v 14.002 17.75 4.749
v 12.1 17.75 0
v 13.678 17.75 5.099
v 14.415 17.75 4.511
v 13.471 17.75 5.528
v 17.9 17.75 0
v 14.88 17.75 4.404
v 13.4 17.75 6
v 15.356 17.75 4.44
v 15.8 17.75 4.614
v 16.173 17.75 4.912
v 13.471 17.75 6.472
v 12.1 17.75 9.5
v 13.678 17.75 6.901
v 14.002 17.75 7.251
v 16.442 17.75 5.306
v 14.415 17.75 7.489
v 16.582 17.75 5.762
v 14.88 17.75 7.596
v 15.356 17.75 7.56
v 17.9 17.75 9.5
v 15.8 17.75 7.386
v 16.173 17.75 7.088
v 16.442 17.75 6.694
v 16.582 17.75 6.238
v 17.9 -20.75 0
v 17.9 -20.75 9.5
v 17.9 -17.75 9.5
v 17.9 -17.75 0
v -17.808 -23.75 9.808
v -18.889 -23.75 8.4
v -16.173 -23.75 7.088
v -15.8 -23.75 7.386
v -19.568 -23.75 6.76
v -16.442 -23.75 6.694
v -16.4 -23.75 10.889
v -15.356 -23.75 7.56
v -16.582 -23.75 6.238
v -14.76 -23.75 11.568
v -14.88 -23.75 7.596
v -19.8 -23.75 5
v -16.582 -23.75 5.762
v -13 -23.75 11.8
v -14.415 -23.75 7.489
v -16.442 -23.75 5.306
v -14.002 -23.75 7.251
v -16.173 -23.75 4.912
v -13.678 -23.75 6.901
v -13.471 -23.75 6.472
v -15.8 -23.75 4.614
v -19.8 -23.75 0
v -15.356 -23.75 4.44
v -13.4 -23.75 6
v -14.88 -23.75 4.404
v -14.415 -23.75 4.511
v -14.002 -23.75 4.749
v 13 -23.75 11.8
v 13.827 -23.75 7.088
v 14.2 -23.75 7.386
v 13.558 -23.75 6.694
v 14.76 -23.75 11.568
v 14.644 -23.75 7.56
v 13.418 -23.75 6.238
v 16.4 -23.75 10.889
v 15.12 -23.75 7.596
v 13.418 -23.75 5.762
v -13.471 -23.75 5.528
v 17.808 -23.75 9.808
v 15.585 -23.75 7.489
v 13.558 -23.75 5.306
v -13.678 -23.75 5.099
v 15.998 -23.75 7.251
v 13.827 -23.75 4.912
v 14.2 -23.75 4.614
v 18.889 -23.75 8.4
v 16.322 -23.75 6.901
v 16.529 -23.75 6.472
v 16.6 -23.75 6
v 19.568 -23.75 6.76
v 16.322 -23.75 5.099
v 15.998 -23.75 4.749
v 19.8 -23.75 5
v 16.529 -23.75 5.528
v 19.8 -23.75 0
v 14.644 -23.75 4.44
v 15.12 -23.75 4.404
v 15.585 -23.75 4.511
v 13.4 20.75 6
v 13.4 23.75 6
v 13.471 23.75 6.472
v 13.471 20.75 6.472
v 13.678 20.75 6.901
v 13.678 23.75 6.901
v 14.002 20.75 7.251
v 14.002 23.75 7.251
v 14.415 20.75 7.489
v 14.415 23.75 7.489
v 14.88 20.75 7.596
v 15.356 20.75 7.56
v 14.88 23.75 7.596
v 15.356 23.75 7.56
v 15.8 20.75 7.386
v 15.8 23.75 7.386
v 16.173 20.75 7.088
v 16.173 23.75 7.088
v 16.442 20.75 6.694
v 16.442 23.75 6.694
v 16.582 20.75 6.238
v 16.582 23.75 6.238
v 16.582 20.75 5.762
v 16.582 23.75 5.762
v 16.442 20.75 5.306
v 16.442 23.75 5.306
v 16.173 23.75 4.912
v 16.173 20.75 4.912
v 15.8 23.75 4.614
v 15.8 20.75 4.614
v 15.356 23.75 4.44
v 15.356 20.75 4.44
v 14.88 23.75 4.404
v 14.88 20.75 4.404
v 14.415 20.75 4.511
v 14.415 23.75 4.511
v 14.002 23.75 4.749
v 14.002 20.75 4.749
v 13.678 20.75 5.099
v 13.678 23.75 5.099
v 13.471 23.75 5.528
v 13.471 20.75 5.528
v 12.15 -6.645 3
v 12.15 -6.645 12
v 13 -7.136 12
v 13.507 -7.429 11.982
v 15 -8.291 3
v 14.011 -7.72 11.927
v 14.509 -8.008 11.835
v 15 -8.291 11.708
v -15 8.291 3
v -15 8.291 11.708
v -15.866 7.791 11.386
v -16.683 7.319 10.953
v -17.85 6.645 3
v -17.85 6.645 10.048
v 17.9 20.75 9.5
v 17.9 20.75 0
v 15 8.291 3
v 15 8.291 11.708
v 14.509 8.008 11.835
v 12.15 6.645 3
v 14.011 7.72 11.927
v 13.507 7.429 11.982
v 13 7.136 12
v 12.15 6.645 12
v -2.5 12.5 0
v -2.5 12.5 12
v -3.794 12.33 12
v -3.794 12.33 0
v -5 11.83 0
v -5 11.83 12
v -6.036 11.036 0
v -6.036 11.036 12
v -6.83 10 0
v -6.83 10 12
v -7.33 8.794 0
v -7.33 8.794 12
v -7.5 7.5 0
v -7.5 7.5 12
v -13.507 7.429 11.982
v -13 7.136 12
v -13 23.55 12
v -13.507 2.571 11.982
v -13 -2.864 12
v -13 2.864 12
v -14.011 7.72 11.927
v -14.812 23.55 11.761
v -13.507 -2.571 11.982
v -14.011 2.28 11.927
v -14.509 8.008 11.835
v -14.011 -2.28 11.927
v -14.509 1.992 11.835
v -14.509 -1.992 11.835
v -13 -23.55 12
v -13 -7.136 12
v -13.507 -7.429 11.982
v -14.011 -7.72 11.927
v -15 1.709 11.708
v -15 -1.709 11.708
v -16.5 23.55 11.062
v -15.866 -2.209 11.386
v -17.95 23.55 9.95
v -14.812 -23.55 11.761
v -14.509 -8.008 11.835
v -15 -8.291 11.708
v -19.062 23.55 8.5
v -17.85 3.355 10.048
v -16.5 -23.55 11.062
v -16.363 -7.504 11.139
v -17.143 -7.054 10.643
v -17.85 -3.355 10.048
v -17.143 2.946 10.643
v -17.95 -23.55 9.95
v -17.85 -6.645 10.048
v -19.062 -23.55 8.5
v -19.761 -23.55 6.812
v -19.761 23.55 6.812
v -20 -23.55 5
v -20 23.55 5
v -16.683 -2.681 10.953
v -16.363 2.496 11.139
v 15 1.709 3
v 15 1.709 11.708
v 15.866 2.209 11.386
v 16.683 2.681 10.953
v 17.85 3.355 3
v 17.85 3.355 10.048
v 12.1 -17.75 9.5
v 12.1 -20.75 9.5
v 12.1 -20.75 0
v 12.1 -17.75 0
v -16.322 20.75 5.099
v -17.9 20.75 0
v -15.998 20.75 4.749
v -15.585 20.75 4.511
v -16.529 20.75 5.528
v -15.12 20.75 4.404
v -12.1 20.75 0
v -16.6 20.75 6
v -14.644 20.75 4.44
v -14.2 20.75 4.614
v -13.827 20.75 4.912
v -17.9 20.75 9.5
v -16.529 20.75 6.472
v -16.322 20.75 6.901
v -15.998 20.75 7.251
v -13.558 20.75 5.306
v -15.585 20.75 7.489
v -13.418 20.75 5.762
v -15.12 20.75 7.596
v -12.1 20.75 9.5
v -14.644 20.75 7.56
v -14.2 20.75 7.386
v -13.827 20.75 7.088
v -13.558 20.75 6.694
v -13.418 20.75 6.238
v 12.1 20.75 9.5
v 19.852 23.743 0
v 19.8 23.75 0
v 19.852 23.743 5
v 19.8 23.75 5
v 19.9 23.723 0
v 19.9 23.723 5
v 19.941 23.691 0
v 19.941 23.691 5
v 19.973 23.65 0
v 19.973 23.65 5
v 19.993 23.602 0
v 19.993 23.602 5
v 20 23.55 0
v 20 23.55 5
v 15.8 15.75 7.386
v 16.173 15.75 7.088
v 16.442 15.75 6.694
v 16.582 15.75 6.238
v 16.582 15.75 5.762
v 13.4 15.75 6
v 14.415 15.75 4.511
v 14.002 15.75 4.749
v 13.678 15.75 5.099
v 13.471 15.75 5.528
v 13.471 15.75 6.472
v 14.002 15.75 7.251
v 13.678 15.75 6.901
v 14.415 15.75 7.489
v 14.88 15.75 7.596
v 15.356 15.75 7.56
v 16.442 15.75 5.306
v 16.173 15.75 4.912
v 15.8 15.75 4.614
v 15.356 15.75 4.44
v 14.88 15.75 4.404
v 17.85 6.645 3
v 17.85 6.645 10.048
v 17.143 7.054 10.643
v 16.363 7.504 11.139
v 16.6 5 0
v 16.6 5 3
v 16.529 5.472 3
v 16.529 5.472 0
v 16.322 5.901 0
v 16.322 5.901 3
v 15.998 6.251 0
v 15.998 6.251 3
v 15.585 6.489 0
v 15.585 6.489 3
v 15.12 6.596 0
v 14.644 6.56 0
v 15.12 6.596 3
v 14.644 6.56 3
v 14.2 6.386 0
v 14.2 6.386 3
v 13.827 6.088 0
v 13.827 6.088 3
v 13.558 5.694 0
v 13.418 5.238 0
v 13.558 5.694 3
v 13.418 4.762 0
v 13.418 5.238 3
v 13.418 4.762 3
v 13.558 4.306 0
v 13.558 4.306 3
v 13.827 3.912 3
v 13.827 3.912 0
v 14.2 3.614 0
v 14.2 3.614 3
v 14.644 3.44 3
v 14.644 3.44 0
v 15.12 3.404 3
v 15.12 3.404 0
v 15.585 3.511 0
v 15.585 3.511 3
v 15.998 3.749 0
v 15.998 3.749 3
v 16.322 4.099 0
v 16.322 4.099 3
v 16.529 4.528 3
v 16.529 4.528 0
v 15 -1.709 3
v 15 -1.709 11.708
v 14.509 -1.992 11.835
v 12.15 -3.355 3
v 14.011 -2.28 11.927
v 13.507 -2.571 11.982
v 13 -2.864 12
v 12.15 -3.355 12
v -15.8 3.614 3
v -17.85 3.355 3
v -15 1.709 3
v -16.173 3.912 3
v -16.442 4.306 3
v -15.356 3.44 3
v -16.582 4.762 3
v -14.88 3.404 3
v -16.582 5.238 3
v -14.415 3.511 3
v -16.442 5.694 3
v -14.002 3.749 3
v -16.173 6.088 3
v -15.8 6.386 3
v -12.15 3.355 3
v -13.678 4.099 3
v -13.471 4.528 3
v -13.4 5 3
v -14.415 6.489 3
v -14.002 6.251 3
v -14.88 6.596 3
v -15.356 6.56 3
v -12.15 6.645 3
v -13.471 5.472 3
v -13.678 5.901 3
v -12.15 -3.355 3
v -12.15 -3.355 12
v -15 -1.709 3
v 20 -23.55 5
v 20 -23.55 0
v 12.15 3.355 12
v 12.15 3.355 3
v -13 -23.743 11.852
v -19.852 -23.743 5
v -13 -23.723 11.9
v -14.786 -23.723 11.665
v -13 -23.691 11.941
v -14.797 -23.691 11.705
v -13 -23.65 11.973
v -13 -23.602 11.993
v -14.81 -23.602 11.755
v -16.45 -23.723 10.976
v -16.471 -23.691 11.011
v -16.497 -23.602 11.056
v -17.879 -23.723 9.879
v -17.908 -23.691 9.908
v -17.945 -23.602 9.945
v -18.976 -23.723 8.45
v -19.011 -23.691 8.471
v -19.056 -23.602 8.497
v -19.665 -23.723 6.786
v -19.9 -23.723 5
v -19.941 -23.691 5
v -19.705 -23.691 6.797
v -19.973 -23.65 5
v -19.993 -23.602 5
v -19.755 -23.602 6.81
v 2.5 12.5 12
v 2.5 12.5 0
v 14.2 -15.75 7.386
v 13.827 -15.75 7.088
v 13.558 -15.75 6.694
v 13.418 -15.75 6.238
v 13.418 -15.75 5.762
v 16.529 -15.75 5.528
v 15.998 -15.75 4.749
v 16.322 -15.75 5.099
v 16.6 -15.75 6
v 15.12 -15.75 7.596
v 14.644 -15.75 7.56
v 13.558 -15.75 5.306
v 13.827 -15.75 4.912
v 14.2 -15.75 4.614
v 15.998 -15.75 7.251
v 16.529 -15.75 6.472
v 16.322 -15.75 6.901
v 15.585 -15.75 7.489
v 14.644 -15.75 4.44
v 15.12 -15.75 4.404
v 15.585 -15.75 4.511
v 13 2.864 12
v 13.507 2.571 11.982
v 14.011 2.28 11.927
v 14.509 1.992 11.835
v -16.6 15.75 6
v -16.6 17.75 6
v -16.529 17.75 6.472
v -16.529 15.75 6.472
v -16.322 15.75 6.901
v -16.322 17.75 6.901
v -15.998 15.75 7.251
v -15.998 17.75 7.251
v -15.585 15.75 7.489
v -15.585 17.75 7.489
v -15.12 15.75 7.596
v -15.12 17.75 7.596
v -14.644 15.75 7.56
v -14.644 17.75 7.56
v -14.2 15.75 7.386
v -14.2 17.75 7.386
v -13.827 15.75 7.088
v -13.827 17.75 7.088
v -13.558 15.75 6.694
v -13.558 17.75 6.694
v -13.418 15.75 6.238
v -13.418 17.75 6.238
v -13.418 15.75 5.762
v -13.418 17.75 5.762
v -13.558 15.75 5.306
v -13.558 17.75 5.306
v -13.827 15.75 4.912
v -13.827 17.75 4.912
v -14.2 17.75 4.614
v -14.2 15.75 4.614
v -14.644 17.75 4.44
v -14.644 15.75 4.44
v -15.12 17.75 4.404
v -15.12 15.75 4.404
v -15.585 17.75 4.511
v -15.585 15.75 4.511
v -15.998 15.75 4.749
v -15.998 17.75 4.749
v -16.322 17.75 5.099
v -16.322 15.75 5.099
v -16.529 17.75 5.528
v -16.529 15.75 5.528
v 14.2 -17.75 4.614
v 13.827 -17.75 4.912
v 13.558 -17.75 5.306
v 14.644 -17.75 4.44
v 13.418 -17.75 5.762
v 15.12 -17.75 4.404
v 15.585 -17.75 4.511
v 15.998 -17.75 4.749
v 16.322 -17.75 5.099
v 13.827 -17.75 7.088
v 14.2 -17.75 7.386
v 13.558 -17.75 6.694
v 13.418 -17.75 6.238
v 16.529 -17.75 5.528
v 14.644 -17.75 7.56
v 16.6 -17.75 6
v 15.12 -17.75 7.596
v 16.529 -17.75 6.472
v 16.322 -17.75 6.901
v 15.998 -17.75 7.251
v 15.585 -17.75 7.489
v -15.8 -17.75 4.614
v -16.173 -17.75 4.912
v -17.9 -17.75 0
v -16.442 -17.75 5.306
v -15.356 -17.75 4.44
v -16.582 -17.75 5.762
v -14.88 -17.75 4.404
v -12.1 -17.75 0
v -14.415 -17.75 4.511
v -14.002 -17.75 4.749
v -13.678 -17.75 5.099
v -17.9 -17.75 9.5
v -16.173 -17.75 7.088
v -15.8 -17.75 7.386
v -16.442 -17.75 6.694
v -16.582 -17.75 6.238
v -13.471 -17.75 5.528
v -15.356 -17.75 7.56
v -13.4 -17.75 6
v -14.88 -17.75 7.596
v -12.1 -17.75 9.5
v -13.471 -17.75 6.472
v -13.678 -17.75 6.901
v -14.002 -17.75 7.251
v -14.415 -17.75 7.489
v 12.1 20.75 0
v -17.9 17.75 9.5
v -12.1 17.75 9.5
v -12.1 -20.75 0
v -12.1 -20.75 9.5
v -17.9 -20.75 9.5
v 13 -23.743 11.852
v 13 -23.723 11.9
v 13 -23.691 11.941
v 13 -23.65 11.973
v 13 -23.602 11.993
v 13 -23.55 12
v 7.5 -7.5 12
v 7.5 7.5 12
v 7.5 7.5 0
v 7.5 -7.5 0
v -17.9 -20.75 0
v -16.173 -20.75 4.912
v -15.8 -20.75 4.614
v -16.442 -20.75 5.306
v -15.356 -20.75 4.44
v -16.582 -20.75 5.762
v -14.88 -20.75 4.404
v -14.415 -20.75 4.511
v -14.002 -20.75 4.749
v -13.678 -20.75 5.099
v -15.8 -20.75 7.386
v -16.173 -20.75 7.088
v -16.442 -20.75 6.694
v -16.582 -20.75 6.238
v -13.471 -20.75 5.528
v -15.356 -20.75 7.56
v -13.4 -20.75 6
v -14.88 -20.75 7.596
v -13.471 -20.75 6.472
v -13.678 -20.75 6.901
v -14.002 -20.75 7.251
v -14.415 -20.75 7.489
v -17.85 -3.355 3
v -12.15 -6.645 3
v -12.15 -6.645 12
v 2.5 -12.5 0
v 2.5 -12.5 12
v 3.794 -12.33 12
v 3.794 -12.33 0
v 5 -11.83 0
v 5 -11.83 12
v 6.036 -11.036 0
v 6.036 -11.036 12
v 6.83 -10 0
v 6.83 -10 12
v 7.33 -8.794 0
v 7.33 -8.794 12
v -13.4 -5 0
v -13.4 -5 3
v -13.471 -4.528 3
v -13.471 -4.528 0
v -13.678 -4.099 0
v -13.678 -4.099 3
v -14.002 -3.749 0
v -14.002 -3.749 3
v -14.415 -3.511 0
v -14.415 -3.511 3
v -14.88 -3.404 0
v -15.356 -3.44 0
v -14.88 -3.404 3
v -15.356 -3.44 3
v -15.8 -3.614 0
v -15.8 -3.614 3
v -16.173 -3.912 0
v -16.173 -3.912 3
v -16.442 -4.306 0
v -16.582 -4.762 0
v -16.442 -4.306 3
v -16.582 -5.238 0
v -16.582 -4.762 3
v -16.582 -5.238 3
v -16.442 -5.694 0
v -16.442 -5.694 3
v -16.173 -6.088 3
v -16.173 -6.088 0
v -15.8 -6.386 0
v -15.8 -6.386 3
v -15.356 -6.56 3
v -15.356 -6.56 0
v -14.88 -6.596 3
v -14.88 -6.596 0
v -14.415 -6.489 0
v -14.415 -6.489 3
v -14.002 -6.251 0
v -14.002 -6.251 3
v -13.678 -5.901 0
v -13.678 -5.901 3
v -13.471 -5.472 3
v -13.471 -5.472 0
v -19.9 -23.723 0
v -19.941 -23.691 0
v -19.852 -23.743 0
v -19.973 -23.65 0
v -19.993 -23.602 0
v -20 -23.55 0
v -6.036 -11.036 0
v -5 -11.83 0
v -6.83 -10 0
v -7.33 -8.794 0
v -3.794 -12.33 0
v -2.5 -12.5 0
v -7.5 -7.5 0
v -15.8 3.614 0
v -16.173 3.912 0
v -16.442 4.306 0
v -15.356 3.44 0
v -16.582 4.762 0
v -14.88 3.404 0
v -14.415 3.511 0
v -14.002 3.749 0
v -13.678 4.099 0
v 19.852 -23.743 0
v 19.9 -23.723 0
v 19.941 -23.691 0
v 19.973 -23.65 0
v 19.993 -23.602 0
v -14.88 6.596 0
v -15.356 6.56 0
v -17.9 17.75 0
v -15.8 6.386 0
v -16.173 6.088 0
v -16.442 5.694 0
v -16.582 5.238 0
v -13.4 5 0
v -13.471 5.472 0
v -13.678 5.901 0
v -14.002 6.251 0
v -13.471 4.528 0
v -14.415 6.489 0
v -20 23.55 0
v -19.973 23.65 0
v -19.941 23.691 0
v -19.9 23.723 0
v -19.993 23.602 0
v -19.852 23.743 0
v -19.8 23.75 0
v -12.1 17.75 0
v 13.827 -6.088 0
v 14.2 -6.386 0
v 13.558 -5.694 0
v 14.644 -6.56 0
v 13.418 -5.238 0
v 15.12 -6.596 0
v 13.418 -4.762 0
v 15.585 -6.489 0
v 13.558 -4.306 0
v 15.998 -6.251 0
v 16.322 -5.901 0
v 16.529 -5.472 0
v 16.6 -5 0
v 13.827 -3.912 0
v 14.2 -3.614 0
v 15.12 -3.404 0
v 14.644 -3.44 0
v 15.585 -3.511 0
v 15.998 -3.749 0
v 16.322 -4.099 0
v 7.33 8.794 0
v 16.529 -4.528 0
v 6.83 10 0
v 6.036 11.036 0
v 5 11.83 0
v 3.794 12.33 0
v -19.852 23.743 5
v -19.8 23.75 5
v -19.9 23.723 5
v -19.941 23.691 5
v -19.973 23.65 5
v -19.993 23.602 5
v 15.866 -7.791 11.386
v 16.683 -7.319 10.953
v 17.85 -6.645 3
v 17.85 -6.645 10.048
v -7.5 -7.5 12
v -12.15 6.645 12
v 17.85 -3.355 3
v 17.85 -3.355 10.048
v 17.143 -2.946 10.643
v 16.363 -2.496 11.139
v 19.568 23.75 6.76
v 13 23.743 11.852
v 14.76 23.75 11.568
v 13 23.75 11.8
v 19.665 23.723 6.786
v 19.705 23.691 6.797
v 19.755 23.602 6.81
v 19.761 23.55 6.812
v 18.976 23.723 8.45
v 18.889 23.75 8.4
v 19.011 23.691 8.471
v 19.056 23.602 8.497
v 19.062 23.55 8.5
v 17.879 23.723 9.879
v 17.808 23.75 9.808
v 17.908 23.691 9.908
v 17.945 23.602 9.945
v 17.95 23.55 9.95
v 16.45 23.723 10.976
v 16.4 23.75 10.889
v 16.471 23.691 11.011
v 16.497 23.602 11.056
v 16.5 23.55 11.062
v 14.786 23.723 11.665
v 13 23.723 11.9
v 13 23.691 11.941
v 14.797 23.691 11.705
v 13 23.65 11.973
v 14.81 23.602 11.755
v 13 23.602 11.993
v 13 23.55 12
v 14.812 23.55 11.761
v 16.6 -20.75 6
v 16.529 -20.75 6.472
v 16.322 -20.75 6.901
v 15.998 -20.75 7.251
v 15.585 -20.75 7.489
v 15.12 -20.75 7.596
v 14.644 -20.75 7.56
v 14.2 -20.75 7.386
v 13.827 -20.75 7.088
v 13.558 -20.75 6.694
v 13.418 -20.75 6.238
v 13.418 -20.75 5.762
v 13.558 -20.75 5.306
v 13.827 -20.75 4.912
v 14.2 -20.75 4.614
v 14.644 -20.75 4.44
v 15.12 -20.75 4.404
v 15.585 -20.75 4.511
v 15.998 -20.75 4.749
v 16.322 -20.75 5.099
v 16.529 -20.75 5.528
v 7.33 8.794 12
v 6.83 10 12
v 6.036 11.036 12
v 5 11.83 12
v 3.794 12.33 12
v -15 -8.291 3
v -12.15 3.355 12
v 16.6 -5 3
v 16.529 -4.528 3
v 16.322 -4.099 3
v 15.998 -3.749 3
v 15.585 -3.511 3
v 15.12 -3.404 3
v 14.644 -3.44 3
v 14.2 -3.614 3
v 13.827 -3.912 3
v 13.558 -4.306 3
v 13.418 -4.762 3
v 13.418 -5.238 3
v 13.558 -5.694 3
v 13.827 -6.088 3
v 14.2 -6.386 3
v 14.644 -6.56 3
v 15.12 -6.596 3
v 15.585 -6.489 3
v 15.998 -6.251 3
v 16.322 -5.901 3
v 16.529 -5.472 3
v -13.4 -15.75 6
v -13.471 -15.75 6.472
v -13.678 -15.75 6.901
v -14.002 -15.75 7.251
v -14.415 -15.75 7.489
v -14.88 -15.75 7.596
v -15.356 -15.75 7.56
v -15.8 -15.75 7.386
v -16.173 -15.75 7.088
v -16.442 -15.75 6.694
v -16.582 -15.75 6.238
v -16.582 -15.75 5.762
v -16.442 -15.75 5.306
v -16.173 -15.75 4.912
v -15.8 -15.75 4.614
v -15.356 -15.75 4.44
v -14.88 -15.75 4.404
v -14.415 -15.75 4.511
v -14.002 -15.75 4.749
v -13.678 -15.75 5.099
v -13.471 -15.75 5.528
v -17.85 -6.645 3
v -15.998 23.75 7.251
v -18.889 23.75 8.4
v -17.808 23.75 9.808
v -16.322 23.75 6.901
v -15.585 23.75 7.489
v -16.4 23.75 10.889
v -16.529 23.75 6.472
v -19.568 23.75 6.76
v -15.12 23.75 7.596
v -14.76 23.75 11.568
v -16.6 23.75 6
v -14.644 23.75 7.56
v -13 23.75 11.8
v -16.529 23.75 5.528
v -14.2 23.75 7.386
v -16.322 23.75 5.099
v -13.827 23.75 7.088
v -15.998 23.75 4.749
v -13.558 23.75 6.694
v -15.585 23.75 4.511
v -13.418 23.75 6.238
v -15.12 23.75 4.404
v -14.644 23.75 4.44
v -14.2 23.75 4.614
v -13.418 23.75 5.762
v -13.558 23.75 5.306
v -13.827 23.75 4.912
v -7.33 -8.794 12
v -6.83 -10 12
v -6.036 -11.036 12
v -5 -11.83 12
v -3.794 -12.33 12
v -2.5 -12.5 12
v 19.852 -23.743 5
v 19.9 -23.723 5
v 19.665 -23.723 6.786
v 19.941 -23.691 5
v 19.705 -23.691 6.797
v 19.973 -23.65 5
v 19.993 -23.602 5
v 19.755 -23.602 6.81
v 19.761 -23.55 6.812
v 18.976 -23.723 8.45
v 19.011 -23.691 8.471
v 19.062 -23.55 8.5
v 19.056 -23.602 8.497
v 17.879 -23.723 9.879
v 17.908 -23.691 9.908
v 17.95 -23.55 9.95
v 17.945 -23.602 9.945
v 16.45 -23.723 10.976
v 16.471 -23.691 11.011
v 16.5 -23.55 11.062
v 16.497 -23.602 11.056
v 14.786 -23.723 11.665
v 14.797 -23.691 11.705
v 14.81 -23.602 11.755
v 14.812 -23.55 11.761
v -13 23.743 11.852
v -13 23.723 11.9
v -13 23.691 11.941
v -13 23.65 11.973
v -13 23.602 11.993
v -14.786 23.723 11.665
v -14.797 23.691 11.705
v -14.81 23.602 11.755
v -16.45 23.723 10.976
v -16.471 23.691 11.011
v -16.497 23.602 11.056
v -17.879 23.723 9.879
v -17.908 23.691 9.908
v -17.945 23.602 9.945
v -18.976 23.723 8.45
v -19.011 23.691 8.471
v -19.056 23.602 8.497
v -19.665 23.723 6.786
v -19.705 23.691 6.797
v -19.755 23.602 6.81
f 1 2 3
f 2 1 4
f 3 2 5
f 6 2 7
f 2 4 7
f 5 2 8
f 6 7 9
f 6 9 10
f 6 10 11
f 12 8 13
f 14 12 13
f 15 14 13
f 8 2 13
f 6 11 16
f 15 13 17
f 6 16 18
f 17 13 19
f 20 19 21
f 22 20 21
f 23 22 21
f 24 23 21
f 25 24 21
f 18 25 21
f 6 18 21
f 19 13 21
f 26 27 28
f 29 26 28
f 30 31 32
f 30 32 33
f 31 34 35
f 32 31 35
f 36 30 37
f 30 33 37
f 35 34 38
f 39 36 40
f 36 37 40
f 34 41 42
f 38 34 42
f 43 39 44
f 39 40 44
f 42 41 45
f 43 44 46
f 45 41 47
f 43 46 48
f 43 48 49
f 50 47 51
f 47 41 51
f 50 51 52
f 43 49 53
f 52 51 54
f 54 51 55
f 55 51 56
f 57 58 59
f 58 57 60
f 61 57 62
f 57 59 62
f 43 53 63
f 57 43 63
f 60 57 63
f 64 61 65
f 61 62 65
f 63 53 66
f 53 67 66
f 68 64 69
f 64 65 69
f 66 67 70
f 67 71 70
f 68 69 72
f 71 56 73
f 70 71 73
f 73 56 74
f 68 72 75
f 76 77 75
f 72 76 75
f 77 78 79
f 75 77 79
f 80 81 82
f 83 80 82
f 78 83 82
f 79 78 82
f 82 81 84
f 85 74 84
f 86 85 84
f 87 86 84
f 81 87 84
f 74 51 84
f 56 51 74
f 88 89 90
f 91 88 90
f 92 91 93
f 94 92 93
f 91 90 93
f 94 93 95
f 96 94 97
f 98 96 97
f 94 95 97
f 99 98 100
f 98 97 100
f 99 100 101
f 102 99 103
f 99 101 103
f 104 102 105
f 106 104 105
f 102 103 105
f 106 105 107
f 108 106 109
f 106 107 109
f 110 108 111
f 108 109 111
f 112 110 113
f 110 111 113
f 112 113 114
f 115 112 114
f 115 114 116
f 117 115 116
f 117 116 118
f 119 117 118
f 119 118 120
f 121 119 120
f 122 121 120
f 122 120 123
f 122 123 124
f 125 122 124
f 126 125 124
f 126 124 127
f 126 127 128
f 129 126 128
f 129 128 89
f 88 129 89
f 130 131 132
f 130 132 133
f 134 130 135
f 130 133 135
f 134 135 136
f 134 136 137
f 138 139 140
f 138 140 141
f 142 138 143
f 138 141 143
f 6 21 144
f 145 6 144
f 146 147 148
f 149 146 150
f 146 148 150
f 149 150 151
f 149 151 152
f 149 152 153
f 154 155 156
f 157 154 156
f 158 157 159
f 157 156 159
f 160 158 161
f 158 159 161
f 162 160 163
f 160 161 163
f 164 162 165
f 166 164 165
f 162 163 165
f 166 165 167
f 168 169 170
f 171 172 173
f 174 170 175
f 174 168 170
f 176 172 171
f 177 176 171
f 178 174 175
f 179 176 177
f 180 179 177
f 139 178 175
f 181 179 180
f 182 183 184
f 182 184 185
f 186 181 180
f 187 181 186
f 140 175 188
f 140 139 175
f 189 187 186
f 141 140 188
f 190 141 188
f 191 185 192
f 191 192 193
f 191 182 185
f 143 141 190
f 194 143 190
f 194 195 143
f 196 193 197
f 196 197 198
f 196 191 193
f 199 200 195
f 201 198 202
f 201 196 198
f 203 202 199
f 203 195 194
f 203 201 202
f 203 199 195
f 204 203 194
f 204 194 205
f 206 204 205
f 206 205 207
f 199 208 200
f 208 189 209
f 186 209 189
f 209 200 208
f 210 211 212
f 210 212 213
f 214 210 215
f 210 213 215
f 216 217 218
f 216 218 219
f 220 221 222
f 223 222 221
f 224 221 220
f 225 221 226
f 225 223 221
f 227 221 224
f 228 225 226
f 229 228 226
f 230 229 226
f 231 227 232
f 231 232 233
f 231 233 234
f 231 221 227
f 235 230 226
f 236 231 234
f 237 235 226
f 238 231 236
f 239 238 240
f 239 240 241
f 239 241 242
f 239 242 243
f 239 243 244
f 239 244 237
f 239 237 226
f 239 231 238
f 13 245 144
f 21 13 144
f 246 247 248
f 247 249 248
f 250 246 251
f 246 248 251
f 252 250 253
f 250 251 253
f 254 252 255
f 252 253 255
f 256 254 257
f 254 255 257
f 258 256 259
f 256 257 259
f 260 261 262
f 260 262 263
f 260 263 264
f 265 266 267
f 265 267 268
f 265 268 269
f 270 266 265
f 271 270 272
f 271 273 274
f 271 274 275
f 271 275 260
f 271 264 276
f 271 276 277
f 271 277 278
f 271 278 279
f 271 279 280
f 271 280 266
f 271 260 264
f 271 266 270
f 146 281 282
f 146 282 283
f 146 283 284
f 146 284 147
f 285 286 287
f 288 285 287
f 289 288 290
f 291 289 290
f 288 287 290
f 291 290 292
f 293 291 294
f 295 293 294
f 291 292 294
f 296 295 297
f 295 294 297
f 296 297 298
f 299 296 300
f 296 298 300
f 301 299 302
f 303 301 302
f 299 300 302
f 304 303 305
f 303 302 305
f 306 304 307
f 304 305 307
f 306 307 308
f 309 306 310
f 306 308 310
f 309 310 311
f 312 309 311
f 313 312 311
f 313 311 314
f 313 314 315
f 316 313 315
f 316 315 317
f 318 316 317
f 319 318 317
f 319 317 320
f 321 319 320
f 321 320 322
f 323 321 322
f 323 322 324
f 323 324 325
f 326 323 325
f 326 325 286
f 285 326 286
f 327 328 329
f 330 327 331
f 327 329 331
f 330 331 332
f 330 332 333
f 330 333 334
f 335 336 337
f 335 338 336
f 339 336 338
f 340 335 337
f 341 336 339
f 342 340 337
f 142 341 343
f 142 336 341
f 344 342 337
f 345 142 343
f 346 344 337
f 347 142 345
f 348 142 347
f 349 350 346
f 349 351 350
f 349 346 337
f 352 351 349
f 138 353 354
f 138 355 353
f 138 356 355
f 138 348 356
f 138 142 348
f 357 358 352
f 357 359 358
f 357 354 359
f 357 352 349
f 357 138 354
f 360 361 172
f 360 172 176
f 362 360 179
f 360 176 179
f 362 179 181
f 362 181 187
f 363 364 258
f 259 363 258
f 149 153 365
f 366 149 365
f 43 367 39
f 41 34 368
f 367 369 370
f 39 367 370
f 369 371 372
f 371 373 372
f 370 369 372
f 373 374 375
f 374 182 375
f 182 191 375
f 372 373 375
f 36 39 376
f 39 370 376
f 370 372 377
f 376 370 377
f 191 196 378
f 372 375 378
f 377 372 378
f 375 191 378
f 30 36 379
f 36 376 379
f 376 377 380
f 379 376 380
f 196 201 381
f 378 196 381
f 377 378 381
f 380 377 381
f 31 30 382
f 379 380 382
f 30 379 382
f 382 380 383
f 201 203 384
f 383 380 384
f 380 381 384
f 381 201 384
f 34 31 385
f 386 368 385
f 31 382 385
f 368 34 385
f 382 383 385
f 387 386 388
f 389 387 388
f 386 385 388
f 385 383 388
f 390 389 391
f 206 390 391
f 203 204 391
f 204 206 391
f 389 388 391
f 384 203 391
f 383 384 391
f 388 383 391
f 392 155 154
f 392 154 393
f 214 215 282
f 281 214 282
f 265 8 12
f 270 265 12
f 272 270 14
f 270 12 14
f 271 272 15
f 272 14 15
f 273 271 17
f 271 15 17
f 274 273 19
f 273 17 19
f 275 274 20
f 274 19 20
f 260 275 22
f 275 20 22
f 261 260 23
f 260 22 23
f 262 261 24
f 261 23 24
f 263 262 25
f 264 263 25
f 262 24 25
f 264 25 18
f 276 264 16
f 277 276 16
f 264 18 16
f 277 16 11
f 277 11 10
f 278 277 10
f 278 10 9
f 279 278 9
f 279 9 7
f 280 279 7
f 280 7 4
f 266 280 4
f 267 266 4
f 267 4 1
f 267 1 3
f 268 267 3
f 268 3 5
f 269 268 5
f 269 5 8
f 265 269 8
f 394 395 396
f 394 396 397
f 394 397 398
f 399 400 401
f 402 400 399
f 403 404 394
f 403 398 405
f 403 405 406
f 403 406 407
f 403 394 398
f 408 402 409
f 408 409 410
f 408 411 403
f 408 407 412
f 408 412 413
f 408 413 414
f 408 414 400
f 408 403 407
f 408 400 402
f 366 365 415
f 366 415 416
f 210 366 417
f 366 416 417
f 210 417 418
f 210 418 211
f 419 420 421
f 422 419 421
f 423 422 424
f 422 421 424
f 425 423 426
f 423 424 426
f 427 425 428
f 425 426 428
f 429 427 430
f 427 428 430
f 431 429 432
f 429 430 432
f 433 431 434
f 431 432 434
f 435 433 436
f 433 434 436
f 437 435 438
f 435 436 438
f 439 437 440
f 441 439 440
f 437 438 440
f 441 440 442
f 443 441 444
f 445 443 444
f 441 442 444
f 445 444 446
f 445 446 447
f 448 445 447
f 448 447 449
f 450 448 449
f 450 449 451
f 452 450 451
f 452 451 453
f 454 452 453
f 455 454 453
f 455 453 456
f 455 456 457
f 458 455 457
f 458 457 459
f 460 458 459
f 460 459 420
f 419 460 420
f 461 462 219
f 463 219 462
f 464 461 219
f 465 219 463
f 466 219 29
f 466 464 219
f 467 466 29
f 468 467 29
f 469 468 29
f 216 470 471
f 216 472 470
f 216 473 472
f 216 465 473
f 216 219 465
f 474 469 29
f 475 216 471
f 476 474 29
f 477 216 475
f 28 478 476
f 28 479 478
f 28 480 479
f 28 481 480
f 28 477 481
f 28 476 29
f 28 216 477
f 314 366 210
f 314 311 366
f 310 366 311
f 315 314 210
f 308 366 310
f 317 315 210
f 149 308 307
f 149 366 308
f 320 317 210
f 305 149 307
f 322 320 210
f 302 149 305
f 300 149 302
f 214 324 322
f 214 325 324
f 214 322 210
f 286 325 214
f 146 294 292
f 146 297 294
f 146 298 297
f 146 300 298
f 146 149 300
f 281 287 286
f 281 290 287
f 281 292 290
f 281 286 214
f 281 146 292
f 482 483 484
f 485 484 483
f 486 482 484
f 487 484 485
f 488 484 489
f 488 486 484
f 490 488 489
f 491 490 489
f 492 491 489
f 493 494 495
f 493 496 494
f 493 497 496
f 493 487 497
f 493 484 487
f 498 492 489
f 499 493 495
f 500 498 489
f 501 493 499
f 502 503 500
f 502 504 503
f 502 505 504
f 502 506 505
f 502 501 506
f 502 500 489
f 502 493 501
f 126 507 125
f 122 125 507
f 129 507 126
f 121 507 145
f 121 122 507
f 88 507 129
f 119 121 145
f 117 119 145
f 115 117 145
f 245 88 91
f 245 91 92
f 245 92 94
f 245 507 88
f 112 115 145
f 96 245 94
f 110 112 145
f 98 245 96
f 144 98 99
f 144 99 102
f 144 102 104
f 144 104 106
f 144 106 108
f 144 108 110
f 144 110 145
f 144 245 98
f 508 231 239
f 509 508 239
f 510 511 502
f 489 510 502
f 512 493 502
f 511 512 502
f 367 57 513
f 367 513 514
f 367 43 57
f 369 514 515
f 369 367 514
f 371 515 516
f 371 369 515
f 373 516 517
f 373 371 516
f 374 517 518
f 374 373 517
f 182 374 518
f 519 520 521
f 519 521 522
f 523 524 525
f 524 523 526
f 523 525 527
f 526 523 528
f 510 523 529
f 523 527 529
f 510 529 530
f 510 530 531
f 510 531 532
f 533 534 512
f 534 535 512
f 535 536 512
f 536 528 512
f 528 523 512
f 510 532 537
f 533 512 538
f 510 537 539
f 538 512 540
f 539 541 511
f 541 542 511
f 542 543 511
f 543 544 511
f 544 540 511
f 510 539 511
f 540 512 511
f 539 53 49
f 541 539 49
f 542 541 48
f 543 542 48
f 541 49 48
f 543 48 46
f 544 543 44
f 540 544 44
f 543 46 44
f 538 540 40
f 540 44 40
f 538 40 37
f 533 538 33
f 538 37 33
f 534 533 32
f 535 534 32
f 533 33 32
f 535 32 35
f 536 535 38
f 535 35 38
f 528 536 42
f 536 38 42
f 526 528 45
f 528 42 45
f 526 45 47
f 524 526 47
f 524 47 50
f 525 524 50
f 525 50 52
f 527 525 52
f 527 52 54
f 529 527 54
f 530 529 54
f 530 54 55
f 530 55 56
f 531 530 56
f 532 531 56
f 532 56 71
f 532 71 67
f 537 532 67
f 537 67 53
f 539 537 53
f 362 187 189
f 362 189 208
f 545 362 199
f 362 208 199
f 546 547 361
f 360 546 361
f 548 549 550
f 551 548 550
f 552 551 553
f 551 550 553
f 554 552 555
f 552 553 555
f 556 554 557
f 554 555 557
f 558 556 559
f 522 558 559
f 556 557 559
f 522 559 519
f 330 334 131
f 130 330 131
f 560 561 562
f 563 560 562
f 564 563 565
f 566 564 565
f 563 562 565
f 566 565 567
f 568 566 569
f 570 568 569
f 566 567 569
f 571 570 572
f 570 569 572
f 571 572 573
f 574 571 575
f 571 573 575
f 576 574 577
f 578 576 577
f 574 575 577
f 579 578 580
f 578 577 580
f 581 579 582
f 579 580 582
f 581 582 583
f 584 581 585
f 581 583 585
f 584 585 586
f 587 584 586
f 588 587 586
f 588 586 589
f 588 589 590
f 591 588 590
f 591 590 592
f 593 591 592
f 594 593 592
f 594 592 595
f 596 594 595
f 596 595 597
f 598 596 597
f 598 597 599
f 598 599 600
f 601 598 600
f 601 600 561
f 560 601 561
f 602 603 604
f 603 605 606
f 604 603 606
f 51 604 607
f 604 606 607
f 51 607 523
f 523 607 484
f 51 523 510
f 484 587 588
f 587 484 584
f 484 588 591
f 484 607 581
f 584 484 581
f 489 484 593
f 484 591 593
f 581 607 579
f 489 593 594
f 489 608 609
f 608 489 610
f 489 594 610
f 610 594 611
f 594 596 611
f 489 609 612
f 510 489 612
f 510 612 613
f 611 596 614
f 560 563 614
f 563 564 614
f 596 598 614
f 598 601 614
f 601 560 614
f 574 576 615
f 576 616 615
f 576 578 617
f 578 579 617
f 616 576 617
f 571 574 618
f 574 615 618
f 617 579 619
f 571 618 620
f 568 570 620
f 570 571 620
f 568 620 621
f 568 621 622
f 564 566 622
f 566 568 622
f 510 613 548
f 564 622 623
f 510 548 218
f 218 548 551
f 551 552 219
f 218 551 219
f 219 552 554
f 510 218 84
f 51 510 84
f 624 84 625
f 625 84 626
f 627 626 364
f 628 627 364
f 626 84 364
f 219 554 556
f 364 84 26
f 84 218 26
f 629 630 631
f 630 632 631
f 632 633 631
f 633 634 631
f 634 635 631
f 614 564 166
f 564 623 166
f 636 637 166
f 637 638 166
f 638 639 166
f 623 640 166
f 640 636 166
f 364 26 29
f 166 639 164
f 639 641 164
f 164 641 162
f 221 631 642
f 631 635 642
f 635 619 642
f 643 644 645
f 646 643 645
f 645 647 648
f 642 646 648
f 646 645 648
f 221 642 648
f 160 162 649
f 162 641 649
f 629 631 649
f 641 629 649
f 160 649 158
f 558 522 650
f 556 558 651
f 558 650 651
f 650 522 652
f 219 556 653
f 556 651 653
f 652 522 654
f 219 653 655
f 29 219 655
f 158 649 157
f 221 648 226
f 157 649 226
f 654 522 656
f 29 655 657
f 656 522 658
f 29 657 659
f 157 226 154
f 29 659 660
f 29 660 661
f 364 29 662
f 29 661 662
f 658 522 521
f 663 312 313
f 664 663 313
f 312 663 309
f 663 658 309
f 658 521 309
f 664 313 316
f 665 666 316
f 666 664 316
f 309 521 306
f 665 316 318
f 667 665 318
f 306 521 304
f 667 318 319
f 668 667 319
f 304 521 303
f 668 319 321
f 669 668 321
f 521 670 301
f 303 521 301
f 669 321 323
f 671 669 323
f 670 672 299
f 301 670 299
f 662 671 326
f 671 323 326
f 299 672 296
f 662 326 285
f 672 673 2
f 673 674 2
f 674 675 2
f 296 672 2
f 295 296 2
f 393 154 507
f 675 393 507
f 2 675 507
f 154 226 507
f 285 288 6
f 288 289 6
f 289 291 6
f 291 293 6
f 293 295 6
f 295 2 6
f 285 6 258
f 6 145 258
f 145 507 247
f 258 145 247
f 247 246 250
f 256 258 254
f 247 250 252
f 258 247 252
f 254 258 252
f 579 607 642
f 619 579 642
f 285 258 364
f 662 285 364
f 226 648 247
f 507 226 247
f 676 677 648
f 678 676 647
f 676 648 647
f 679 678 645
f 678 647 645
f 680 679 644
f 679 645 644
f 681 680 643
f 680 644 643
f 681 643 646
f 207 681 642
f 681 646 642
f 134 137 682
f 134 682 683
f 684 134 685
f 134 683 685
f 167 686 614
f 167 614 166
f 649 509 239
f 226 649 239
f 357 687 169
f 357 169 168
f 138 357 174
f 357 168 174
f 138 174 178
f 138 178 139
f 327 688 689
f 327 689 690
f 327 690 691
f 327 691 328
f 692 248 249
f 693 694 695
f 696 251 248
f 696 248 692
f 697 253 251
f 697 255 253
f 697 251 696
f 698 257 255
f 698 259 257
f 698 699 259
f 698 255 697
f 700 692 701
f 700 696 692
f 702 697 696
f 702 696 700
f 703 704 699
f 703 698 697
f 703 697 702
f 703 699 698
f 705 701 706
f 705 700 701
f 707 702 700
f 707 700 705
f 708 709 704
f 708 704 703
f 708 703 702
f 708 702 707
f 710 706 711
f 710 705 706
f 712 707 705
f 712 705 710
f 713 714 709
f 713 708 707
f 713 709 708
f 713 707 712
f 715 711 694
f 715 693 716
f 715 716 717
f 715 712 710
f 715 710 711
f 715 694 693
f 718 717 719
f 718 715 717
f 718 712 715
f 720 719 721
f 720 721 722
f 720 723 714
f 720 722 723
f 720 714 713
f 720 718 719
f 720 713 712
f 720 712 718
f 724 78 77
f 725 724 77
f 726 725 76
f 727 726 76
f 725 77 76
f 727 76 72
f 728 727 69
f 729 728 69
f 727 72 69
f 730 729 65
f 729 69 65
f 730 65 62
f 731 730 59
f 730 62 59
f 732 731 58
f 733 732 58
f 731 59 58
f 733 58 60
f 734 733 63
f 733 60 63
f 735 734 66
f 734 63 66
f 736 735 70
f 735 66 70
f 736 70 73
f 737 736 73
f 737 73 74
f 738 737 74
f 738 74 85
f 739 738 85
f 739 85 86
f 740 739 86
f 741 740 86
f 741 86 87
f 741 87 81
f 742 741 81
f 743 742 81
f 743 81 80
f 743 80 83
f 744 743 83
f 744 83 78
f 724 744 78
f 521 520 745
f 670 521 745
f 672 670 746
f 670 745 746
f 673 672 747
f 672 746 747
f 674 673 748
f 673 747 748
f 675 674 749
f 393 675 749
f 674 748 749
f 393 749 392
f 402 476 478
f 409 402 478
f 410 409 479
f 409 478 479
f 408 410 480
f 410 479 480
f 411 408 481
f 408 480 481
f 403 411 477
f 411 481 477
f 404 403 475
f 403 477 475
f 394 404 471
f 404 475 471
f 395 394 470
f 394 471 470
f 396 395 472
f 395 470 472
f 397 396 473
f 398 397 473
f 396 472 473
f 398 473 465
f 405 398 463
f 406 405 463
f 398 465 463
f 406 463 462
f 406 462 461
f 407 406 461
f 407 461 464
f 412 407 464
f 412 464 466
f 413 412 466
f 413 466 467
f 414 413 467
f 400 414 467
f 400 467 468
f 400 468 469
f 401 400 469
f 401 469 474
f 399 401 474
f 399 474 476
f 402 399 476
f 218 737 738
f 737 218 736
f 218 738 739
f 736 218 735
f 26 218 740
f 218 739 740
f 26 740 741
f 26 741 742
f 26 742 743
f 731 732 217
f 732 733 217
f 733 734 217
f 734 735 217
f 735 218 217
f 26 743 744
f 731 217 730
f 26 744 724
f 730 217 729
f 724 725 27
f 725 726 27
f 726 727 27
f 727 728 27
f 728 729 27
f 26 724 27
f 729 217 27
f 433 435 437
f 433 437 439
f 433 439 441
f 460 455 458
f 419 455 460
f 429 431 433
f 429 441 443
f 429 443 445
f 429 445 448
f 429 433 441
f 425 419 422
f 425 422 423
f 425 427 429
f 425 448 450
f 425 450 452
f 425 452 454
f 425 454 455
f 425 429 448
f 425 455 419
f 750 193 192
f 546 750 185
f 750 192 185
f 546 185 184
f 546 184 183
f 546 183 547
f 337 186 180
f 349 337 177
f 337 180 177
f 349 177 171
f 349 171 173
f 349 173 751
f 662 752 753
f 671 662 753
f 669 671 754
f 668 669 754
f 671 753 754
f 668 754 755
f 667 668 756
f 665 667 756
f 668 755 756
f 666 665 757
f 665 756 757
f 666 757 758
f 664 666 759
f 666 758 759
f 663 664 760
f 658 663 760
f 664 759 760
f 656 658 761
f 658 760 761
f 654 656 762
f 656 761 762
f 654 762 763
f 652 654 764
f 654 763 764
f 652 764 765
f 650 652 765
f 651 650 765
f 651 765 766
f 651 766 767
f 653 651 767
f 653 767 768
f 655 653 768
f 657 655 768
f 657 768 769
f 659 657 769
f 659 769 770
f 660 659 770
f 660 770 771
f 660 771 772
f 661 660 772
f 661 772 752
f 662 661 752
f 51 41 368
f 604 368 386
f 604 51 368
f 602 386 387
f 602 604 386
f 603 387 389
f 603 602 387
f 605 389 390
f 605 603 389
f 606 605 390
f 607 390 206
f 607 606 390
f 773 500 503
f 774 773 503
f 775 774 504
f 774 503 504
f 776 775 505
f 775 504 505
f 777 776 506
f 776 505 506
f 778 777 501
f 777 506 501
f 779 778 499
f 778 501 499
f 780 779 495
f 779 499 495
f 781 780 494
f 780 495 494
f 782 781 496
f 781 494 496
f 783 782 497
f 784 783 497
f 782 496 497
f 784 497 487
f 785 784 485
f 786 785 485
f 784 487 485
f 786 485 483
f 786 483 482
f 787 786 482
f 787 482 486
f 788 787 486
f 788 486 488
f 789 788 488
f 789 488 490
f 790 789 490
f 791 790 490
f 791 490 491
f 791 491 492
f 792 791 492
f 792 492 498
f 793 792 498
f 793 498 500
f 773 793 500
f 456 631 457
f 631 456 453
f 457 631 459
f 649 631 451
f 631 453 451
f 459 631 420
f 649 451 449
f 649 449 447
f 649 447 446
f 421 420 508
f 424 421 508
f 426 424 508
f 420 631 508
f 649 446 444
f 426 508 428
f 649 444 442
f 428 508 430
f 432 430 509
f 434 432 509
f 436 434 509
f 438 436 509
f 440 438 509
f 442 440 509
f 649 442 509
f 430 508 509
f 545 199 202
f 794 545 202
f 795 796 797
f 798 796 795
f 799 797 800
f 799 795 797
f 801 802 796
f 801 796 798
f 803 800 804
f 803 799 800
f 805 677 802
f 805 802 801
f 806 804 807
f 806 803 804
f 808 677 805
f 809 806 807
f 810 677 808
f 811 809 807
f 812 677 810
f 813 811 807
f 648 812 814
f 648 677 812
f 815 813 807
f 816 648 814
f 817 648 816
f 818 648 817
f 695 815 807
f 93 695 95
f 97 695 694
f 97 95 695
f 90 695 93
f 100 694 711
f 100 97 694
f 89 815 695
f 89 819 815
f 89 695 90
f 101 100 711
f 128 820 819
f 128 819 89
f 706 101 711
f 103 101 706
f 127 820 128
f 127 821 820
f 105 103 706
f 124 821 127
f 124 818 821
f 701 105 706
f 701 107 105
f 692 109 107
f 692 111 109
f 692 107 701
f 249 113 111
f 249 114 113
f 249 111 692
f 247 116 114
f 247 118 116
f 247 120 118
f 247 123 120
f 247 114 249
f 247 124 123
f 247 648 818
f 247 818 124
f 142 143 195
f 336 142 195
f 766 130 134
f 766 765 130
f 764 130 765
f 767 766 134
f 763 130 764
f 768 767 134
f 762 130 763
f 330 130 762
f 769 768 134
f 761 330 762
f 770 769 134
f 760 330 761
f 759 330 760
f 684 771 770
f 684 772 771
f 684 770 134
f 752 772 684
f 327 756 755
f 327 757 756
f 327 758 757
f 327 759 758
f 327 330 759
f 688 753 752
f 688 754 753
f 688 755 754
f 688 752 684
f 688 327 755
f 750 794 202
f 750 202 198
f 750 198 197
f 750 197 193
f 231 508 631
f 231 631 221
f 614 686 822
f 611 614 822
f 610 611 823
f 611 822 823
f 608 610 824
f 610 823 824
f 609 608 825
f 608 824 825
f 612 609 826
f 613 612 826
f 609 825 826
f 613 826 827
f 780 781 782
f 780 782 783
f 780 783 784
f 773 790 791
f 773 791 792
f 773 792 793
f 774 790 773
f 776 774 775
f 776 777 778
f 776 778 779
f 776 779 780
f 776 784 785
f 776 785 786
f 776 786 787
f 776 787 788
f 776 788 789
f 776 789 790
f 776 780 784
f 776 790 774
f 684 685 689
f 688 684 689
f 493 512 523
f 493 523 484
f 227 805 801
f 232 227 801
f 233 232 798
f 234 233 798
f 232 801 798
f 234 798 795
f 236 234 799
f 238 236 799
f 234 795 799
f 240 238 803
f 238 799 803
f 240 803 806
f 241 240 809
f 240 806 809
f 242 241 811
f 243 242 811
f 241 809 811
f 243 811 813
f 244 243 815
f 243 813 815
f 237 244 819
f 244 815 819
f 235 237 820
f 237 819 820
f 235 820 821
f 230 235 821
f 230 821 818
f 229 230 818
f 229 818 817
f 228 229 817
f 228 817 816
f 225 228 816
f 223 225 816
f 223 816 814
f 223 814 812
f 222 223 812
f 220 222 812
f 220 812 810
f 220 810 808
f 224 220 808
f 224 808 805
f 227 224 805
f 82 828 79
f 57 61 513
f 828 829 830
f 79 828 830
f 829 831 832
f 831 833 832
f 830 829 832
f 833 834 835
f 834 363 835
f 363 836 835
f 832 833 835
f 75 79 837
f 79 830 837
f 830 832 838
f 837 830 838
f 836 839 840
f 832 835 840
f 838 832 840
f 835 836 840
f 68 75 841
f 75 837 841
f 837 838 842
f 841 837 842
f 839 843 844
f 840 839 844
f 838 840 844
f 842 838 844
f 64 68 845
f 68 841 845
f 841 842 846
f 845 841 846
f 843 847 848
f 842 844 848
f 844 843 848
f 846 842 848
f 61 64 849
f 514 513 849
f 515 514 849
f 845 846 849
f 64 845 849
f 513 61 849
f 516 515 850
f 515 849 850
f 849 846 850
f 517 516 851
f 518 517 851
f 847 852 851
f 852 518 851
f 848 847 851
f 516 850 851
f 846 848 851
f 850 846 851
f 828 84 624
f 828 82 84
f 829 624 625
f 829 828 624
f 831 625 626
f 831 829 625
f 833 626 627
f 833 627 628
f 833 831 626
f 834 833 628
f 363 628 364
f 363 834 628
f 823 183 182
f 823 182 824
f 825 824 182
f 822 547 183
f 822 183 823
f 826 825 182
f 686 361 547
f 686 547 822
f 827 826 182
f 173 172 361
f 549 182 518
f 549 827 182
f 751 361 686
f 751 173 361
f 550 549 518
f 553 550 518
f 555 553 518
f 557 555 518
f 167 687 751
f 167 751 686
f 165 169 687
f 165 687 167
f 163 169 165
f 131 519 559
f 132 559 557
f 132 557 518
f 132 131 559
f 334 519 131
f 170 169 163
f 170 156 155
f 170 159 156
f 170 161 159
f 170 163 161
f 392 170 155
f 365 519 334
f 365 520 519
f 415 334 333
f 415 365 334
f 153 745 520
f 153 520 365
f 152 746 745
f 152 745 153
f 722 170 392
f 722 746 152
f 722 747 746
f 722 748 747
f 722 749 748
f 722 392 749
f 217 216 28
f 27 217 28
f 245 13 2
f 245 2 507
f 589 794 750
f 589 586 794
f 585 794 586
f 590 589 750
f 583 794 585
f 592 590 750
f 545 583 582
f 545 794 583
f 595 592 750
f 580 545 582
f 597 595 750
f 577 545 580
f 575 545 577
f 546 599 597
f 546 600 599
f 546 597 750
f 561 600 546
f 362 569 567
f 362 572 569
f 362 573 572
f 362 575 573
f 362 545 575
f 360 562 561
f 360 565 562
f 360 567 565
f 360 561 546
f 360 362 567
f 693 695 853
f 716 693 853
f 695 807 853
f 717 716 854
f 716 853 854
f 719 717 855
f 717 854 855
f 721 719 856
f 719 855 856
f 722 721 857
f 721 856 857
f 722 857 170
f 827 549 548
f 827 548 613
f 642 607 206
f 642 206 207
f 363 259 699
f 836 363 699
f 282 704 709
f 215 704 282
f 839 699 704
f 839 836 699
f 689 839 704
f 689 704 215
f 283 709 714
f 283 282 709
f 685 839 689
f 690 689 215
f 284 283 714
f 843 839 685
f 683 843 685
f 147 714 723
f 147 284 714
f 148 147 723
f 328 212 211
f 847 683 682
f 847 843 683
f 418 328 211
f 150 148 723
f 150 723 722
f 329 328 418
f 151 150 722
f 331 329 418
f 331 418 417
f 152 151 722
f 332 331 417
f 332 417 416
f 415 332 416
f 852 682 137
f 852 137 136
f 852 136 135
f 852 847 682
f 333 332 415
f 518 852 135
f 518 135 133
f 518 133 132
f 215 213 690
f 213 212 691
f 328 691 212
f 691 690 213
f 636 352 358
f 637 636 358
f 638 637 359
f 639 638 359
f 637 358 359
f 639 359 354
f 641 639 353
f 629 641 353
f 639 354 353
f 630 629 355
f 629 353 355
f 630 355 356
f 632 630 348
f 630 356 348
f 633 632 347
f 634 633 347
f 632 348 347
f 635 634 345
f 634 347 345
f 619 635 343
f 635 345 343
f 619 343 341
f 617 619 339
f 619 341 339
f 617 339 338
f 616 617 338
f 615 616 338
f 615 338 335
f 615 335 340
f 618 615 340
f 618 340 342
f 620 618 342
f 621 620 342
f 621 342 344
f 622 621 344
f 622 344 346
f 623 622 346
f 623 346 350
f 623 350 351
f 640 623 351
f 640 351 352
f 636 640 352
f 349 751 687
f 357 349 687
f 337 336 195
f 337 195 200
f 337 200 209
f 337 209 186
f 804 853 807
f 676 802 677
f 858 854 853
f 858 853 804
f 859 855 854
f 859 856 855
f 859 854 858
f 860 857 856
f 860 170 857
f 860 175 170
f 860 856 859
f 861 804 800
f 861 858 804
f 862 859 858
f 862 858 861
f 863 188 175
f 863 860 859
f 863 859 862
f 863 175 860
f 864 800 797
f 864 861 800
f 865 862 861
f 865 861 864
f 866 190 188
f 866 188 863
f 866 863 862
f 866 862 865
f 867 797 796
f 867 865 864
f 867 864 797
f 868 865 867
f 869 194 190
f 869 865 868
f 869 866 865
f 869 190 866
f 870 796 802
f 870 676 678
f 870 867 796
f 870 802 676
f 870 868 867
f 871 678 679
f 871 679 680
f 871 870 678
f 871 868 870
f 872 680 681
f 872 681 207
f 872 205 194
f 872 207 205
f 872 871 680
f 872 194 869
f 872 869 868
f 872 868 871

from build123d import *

# Parameters (mm, degrees)
SKETCH_W        = 40
SKETCH_H        = 47.5
PAD_DEPTH       = 12
SKETCH001_R     = 1.6
POCKET_DEPTH    = 8
SKETCH002_R     = 1.6
POCKET001_DEPTH = 8
SKETCH003_W     = 5.8
SKETCH003_H     = 3
POCKET002_DEPTH = 12
SKETCH004_R     = 1.6
POCKET003_DEPTH = 12
POCKET004_DEPTH = 9
POCKET005_DEPTH = 12
POCKET006_DEPTH = 50
FILLET_R        = 0.2


with BuildPart() as part:
    # Sketch → Pad (new body)
    with BuildSketch(Plane.XY):
        Rectangle(SKETCH_W, SKETCH_H)
    extrude(amount=PAD_DEPTH)

    # Sketch001 (on Face3 of Pad) → Pocket (cut)
    with BuildSketch(Plane.XZ.offset(23.75)):
        with Locations((-15, 6)):
            Circle(SKETCH001_R)
        with Locations((15, 6)):
            Circle(SKETCH001_R)
    extrude(amount=-POCKET_DEPTH, mode=Mode.SUBTRACT)

    # Sketch002 (on Face1 of Pocket) → Pocket001 (cut)
    with BuildSketch(Plane(origin=(0, 23.75, 0), x_dir=(-1, 0, 0), z_dir=(0, 1, 0))):
        with Locations((-15, 6)):
            Circle(SKETCH002_R)
        with Locations((15, 6)):
            Circle(SKETCH002_R)
    extrude(amount=-POCKET001_DEPTH, mode=Mode.SUBTRACT)

    # Sketch003 (on Face4 of Pocket001) → Pocket002 (cut)
    with BuildSketch(Plane.XY.offset(9.5)):
        with Locations((-15, 19.25)):
            Rectangle(SKETCH003_W, SKETCH003_H)
        with Locations((15, 19.25)):
            Rectangle(SKETCH003_W, SKETCH003_H)
        with Locations((-15, -19.25)):
            Rectangle(SKETCH003_W, SKETCH003_H)
        with Locations((15, -19.25)):
            Rectangle(SKETCH003_W, SKETCH003_H)
    extrude(amount=-POCKET002_DEPTH, mode=Mode.SUBTRACT)

    # Sketch004 (on Face4 of Pocket002) → Pocket003 (cut)
    with BuildSketch(Plane.XY.offset(12)):
        with Locations((-15, 5)):
            Circle(SKETCH004_R)
        with Locations((15, 5)):
            Circle(SKETCH004_R)
        with Locations((-15, -5)):
            Circle(SKETCH004_R)
        with Locations((15, -5)):
            Circle(SKETCH004_R)
    extrude(amount=-POCKET003_DEPTH, mode=Mode.SUBTRACT)

    # Sketch005 (on Face4 of Pocket003) → Pocket004 (cut)
    with BuildSketch(Plane.XY.offset(12)):
        Polygon((-15, 8.290897), (-17.85, 6.645448), (-17.85, 3.354552), (-15, 1.709103), (-12.15, 3.354552), (-12.15, 6.645448), align=None)
        Polygon((15, 8.290897), (12.15, 6.645448), (12.15, 3.354552), (15, 1.709103), (17.85, 3.354552), (17.85, 6.645448), align=None)
        Polygon((-15, -1.709103), (-17.85, -3.354552), (-17.85, -6.645448), (-15, -8.290897), (-12.15, -6.645448), (-12.15, -3.354552), align=None)
        Polygon((15, -1.709103), (12.15, -3.354552), (12.15, -6.645448), (15, -8.290897), (17.85, -6.645448), (17.85, -3.354552), align=None)
    extrude(amount=-POCKET004_DEPTH, mode=Mode.SUBTRACT)

    # Sketch006 → Pocket005 (cut)
    with BuildSketch(Plane.XY.offset(12)):
        with BuildLine():
            Line((-2.5, 12.5), (2.5, 12.5))
            ThreePointArc((7.5, 7.5), (6.035534, 11.035534), (2.5, 12.5))
            Line((7.5, 7.5), (7.5, -7.5))
            ThreePointArc((2.5, -12.5), (6.035534, -11.035534), (7.5, -7.5))
            Line((2.5, -12.5), (-2.5, -12.5))
            ThreePointArc((-7.5, -7.5), (-6.035534, -11.035534), (-2.5, -12.5))
            Line((-7.5, -7.5), (-7.5, 7.5))
            ThreePointArc((-2.5, 12.5), (-6.035534, 11.035534), (-7.5, 7.5))
        make_face()
    extrude(amount=-POCKET005_DEPTH, mode=Mode.SUBTRACT)

    # Sketch009 (on Face8 of Pocket005) → Pocket006 (cut)
    with BuildSketch(Plane.XZ.offset(23.75)):
        with BuildLine():
            ThreePointArc((-13, 12), (-17.949747, 9.949747), (-20, 5))
            Line((-20, 5), (-20, 13))
            Line((-20, 13), (20, 13))
            Line((20, 13), (20, 5))
            ThreePointArc((20, 5), (17.949747, 9.949747), (13, 12))
            Line((13, 12), (-13, 12))
        make_face()
    extrude(amount=-POCKET006_DEPTH, mode=Mode.SUBTRACT)

    # Fillet
    fillet_edges = [part.edges().sort_by_distance(p)[0] for p in [
        (20, -23.75, 2.5),
        (-20, -23.75, 2.5),
        (20, 23.75, 2.5),
        (-20, 23.75, 2.5),
    ]]
    fillet(fillet_edges, radius=FILLET_R)


solid = part.part
